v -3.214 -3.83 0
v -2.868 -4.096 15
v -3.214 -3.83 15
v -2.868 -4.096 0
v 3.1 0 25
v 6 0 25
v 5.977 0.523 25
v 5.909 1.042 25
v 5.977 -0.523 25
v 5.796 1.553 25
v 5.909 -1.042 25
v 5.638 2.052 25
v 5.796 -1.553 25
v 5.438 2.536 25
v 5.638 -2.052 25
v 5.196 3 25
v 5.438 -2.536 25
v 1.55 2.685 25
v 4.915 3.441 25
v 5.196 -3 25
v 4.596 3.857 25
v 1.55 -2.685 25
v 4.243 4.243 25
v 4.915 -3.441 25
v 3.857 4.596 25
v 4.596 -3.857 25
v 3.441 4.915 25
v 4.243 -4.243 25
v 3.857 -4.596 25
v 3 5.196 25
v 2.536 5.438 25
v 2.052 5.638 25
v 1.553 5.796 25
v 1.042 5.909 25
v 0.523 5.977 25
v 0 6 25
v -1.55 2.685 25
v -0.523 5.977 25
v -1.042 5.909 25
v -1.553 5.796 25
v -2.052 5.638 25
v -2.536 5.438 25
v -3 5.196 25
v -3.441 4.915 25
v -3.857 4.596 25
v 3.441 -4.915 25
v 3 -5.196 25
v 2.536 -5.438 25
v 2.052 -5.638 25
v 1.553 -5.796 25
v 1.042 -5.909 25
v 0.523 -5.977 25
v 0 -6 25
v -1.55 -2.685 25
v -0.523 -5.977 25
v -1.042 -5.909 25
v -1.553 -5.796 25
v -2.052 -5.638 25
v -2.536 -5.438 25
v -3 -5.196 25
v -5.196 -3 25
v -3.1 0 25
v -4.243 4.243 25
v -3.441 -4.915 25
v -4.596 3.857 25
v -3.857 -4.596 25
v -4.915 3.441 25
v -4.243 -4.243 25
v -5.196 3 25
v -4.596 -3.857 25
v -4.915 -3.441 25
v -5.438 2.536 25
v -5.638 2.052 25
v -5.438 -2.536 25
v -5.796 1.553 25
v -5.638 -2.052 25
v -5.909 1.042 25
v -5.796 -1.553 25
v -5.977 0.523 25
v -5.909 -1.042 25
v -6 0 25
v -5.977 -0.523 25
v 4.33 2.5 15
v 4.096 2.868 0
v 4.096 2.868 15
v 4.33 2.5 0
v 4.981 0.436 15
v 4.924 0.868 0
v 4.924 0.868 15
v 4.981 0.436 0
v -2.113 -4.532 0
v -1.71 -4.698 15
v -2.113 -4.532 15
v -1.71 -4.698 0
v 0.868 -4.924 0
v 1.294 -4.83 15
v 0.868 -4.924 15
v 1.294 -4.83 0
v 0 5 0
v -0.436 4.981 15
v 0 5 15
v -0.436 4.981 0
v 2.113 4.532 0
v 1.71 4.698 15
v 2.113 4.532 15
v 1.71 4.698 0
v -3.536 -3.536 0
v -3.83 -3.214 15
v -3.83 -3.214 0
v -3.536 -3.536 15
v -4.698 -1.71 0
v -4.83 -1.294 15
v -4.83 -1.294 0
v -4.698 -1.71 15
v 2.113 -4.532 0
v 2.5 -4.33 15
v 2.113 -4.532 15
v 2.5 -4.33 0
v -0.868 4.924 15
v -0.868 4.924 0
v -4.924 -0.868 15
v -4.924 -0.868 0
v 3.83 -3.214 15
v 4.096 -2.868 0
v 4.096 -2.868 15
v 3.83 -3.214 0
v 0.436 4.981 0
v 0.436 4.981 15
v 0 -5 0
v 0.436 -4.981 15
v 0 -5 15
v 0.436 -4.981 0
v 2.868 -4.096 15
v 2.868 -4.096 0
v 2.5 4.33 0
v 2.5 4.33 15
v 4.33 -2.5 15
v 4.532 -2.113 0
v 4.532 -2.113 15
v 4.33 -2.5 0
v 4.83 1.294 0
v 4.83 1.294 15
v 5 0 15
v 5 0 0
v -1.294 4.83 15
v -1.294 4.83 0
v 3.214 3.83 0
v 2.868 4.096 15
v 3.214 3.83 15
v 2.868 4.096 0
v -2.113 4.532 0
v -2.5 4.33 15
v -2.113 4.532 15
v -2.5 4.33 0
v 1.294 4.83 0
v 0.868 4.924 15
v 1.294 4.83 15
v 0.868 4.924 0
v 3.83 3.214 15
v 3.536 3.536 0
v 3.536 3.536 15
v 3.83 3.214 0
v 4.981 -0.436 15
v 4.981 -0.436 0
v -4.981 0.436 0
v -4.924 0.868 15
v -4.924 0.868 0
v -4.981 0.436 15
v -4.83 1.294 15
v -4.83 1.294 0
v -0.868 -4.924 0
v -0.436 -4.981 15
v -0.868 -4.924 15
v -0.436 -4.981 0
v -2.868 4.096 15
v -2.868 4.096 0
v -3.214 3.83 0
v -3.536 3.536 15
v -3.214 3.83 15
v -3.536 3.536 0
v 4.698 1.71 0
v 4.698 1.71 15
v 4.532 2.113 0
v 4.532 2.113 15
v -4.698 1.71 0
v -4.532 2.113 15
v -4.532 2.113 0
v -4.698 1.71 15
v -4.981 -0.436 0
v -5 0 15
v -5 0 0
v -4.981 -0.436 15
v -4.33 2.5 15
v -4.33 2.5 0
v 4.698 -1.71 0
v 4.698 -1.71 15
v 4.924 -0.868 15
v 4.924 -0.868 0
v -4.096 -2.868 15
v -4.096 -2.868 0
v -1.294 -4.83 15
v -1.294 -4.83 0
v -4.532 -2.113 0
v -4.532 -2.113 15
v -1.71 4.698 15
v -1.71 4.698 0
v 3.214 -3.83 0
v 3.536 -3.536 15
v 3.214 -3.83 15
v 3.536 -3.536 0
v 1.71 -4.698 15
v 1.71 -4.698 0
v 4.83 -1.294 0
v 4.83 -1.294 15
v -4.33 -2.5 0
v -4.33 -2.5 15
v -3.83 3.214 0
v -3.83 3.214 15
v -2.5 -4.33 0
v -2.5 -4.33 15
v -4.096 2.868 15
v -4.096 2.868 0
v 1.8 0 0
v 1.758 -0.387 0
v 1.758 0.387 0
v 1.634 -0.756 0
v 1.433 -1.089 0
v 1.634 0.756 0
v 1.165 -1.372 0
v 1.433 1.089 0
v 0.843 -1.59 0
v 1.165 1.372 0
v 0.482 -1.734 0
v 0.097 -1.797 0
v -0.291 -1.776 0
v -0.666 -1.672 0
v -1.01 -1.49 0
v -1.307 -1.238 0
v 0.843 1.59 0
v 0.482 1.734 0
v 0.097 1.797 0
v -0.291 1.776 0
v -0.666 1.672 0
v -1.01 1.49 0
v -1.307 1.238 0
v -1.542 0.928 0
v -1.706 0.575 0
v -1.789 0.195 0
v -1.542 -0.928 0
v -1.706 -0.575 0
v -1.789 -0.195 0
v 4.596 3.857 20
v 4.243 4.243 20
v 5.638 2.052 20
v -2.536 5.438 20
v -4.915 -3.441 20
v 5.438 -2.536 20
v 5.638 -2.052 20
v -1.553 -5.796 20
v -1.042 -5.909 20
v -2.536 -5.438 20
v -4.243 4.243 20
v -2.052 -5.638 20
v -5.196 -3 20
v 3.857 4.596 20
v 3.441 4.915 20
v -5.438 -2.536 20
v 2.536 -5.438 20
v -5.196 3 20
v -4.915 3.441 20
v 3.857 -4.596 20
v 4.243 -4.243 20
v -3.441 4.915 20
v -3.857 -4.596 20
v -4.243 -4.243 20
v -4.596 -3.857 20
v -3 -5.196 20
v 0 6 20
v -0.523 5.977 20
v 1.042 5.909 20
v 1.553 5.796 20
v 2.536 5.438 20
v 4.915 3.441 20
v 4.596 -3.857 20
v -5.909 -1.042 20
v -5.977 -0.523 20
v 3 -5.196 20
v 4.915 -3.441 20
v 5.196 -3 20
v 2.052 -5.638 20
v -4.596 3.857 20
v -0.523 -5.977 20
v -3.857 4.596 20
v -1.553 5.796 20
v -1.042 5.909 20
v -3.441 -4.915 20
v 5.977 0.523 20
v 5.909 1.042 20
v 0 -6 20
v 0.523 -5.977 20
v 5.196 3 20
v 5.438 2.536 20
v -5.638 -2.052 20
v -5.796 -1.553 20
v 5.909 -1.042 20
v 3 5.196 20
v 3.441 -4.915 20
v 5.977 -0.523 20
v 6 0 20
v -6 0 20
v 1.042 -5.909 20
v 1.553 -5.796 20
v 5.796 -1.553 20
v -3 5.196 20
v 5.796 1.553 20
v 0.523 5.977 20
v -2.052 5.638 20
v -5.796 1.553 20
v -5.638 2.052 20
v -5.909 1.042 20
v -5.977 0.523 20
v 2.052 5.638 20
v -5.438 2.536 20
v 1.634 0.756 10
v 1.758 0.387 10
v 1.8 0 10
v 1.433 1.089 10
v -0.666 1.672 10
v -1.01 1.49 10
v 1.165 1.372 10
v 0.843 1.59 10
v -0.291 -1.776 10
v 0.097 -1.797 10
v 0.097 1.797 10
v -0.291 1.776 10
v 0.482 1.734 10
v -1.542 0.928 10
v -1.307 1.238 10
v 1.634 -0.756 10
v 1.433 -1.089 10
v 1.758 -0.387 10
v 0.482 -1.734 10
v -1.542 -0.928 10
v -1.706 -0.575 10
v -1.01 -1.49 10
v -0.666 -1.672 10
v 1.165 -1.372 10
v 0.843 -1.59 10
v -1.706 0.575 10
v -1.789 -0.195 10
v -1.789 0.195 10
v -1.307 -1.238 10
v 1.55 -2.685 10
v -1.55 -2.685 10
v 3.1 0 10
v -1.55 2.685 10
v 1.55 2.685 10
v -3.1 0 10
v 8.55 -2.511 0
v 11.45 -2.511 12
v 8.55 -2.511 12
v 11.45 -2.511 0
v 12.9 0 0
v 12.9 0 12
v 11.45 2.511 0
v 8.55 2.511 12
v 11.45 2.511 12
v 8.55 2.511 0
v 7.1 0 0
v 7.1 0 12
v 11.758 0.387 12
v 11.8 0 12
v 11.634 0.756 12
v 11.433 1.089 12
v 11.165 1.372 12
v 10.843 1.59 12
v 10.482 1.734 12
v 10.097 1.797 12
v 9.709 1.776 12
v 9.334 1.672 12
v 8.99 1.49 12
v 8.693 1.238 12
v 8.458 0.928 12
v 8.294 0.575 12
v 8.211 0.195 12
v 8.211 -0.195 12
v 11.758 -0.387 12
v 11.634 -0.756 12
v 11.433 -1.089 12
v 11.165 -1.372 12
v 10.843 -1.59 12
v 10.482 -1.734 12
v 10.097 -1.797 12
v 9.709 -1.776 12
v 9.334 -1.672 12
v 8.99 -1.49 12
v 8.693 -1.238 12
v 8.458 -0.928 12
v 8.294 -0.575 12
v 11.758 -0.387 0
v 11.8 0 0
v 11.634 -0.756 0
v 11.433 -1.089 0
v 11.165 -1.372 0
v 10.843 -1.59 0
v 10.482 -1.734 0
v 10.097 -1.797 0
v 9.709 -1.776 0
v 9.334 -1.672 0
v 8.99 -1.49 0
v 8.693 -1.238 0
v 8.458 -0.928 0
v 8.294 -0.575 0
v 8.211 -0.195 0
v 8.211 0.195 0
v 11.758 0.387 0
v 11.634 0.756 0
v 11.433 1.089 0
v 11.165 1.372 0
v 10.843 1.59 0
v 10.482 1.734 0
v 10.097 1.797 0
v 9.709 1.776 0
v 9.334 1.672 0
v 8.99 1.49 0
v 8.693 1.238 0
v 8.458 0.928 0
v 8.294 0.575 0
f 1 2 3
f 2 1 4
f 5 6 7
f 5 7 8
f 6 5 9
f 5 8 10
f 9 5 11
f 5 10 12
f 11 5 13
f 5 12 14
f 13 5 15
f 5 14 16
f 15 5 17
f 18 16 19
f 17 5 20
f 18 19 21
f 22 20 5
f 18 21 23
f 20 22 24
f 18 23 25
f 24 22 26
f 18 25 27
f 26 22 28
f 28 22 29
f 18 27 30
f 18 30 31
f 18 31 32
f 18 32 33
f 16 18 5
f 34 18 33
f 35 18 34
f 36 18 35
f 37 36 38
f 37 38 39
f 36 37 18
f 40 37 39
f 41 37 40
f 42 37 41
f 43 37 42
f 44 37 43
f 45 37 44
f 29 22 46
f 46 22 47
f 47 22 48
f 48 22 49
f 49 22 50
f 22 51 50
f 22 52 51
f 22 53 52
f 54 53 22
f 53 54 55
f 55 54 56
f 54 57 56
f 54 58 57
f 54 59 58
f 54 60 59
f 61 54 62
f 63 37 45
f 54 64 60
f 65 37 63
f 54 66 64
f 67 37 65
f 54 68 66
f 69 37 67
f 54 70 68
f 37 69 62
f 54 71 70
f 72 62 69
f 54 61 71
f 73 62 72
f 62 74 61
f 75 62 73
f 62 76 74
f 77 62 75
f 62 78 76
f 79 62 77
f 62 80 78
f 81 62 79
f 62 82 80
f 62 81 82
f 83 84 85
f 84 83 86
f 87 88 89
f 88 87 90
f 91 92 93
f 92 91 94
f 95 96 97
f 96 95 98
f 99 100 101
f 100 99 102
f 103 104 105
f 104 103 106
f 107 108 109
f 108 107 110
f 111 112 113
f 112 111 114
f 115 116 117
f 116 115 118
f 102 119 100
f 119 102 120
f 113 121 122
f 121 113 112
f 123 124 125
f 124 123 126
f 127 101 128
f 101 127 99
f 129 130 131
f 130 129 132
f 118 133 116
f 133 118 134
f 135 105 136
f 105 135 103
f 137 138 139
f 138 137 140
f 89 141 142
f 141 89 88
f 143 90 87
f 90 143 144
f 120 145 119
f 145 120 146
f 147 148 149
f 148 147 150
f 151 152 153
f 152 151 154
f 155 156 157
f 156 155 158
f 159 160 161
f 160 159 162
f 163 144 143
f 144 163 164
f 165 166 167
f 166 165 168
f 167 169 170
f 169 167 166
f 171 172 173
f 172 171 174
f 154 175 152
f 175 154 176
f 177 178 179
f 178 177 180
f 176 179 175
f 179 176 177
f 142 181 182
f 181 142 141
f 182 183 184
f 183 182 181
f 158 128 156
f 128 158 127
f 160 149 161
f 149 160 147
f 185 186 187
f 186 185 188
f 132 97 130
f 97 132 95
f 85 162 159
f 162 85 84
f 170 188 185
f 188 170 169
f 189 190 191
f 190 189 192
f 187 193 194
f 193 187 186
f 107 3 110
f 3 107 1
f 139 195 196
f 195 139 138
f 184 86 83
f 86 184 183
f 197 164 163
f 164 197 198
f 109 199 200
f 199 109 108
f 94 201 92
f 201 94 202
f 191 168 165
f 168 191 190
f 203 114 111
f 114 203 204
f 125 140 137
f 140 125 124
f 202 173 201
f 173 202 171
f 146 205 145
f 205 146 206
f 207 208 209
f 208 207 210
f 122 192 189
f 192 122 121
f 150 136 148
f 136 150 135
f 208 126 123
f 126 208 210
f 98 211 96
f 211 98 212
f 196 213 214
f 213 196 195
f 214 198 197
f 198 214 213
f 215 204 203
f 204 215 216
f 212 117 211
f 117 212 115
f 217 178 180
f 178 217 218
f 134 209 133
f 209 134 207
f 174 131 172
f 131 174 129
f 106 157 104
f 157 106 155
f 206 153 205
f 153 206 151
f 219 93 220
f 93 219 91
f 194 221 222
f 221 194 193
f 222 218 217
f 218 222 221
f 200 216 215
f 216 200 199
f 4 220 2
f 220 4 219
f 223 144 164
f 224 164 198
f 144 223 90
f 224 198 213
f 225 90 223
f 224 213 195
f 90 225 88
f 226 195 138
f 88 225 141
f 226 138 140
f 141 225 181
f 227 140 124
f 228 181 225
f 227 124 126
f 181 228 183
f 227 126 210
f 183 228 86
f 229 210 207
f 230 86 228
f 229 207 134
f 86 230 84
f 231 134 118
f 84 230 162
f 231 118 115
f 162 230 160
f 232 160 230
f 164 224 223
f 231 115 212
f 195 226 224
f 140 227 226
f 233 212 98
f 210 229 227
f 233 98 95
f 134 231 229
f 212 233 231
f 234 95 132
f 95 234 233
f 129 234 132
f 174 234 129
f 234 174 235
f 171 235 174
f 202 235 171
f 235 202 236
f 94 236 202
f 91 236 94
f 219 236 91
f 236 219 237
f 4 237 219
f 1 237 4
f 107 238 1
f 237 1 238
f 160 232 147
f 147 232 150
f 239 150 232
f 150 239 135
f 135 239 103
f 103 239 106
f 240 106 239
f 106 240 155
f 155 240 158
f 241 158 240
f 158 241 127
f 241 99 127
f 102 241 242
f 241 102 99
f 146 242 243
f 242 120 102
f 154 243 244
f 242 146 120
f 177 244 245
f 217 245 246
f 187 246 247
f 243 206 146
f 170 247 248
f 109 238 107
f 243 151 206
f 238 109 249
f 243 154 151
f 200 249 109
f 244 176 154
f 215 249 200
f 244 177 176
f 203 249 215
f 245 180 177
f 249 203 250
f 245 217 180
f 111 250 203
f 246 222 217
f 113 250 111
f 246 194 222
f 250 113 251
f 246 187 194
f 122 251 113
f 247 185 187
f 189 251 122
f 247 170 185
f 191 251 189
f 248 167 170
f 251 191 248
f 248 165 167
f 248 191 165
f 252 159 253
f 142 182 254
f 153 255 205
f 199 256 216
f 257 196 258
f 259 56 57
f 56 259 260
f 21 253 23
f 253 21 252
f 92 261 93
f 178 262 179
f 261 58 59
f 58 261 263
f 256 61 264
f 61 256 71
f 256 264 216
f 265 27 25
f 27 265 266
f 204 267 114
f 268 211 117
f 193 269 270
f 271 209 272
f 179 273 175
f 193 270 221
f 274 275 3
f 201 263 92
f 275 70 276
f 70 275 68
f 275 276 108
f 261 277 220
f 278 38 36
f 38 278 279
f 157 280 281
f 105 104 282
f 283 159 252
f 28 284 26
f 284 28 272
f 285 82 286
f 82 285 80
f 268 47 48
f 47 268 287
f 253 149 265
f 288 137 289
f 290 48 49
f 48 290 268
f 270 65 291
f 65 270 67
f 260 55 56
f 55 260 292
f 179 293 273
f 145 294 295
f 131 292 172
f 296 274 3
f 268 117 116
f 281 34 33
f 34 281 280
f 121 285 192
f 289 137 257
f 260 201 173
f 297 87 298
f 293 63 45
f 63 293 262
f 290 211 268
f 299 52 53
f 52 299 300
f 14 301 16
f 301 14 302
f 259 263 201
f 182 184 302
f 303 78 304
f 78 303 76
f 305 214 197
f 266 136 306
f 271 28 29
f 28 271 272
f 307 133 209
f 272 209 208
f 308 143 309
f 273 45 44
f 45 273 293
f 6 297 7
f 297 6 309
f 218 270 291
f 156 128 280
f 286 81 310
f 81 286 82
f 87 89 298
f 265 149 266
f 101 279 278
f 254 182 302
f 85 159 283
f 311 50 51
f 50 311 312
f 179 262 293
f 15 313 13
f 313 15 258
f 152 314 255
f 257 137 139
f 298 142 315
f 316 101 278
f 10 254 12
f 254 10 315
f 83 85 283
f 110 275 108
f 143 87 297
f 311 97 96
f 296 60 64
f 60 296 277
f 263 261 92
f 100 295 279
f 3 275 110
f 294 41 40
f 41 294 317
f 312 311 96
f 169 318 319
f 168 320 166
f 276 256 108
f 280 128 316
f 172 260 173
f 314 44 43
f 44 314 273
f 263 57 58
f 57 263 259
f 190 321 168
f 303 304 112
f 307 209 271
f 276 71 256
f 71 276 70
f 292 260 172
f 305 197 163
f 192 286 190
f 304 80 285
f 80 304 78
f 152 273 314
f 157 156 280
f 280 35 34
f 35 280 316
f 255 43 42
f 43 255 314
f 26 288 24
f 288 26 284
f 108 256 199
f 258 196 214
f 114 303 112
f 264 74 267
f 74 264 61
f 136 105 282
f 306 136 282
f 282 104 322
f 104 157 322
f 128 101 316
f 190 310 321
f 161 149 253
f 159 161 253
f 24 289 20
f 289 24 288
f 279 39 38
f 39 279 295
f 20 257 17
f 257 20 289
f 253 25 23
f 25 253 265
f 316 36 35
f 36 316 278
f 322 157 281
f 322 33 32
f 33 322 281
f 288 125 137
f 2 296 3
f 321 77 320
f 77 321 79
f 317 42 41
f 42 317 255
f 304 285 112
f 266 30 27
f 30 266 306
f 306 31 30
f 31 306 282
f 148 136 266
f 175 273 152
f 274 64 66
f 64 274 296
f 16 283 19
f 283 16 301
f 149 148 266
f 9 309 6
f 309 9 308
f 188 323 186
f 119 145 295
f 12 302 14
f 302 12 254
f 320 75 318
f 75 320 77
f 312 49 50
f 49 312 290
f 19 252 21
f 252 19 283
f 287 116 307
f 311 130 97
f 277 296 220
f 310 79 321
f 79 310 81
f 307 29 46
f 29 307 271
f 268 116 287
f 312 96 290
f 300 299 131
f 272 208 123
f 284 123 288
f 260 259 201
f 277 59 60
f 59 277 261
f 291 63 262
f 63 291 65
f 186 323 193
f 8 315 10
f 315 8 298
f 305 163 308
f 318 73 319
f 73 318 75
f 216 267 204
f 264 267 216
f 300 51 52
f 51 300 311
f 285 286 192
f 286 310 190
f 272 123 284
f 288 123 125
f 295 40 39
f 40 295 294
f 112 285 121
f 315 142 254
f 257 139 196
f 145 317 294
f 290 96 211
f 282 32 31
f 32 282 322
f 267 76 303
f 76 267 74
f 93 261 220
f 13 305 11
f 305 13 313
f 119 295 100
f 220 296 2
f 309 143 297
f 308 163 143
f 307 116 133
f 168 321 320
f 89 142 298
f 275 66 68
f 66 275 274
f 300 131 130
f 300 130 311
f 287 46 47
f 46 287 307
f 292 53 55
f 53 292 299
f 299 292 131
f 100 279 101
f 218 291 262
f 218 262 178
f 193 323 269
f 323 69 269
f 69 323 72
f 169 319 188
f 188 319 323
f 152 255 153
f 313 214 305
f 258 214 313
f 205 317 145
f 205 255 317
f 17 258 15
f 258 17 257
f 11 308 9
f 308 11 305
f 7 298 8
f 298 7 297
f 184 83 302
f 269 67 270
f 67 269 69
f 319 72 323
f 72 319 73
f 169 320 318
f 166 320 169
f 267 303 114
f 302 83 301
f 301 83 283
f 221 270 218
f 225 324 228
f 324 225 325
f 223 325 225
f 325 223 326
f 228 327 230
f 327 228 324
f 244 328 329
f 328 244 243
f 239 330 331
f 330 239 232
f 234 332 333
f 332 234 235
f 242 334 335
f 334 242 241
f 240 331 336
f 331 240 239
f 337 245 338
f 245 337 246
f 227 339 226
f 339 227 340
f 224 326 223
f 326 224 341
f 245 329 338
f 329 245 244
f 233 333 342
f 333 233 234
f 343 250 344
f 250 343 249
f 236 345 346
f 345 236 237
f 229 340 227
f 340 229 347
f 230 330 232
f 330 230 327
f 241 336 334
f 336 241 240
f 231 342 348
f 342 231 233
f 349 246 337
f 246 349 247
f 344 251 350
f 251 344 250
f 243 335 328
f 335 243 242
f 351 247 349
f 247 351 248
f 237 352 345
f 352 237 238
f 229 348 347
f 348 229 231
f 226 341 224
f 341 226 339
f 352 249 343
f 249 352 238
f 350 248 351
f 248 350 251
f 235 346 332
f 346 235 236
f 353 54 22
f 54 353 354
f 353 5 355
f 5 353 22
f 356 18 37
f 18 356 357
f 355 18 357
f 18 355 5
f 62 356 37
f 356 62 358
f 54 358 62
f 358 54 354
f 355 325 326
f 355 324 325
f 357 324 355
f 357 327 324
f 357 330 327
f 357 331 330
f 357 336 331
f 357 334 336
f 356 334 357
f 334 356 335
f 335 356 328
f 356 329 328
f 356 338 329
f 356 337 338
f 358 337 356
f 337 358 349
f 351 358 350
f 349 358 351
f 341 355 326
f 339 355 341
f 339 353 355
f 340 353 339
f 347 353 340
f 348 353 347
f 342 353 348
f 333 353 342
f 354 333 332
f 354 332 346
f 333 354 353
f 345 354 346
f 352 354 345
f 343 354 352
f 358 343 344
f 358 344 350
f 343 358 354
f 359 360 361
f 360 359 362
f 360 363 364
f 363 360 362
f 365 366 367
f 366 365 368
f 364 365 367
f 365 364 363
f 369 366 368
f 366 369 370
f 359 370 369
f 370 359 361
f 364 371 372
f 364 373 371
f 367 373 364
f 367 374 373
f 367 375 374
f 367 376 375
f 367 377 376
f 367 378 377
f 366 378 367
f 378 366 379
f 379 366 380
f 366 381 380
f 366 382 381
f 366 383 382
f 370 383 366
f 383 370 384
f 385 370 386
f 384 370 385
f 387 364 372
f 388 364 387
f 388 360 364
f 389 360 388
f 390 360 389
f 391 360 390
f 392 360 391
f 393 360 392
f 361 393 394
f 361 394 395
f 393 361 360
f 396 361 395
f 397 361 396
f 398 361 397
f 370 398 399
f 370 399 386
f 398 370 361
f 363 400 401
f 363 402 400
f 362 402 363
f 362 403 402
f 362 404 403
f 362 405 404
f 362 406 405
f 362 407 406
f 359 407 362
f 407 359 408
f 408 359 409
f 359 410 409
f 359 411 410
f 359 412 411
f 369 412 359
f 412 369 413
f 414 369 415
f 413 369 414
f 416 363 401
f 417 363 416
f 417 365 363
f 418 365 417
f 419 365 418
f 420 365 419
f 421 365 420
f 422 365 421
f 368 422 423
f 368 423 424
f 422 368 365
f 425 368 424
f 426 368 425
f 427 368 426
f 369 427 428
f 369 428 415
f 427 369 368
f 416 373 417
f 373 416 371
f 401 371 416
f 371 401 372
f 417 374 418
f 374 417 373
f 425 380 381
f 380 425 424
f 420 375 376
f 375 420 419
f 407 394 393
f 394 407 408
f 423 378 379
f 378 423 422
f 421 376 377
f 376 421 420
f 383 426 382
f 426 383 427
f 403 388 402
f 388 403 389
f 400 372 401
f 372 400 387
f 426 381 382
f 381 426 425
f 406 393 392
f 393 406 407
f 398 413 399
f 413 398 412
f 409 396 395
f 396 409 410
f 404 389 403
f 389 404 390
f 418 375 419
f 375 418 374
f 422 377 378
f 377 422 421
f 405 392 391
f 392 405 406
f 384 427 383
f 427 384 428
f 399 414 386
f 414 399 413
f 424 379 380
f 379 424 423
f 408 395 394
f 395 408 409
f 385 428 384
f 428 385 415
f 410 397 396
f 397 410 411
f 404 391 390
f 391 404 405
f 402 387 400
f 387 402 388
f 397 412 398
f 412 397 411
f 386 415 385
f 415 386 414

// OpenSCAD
//$fn=60;
$fa=5;
$fs=.4;

difference(){
    union(){    
        cylinder(d=10,h=25);
        hull(){
            translate([0,0,15]) cylinder(d=10,h=1);
            translate([0,0,20]) cylinder(d=12,h=5);
        }
    }
    cylinder(d=3.6,h=25);
    translate([0,0,10]) cylinder(d=6.2,h=15,$fn=6);
}
translate([10,0,0]) difference(){
    cylinder(d=5.8,h=12,$fn=6);
    cylinder(d=3.6,h=25);
}
